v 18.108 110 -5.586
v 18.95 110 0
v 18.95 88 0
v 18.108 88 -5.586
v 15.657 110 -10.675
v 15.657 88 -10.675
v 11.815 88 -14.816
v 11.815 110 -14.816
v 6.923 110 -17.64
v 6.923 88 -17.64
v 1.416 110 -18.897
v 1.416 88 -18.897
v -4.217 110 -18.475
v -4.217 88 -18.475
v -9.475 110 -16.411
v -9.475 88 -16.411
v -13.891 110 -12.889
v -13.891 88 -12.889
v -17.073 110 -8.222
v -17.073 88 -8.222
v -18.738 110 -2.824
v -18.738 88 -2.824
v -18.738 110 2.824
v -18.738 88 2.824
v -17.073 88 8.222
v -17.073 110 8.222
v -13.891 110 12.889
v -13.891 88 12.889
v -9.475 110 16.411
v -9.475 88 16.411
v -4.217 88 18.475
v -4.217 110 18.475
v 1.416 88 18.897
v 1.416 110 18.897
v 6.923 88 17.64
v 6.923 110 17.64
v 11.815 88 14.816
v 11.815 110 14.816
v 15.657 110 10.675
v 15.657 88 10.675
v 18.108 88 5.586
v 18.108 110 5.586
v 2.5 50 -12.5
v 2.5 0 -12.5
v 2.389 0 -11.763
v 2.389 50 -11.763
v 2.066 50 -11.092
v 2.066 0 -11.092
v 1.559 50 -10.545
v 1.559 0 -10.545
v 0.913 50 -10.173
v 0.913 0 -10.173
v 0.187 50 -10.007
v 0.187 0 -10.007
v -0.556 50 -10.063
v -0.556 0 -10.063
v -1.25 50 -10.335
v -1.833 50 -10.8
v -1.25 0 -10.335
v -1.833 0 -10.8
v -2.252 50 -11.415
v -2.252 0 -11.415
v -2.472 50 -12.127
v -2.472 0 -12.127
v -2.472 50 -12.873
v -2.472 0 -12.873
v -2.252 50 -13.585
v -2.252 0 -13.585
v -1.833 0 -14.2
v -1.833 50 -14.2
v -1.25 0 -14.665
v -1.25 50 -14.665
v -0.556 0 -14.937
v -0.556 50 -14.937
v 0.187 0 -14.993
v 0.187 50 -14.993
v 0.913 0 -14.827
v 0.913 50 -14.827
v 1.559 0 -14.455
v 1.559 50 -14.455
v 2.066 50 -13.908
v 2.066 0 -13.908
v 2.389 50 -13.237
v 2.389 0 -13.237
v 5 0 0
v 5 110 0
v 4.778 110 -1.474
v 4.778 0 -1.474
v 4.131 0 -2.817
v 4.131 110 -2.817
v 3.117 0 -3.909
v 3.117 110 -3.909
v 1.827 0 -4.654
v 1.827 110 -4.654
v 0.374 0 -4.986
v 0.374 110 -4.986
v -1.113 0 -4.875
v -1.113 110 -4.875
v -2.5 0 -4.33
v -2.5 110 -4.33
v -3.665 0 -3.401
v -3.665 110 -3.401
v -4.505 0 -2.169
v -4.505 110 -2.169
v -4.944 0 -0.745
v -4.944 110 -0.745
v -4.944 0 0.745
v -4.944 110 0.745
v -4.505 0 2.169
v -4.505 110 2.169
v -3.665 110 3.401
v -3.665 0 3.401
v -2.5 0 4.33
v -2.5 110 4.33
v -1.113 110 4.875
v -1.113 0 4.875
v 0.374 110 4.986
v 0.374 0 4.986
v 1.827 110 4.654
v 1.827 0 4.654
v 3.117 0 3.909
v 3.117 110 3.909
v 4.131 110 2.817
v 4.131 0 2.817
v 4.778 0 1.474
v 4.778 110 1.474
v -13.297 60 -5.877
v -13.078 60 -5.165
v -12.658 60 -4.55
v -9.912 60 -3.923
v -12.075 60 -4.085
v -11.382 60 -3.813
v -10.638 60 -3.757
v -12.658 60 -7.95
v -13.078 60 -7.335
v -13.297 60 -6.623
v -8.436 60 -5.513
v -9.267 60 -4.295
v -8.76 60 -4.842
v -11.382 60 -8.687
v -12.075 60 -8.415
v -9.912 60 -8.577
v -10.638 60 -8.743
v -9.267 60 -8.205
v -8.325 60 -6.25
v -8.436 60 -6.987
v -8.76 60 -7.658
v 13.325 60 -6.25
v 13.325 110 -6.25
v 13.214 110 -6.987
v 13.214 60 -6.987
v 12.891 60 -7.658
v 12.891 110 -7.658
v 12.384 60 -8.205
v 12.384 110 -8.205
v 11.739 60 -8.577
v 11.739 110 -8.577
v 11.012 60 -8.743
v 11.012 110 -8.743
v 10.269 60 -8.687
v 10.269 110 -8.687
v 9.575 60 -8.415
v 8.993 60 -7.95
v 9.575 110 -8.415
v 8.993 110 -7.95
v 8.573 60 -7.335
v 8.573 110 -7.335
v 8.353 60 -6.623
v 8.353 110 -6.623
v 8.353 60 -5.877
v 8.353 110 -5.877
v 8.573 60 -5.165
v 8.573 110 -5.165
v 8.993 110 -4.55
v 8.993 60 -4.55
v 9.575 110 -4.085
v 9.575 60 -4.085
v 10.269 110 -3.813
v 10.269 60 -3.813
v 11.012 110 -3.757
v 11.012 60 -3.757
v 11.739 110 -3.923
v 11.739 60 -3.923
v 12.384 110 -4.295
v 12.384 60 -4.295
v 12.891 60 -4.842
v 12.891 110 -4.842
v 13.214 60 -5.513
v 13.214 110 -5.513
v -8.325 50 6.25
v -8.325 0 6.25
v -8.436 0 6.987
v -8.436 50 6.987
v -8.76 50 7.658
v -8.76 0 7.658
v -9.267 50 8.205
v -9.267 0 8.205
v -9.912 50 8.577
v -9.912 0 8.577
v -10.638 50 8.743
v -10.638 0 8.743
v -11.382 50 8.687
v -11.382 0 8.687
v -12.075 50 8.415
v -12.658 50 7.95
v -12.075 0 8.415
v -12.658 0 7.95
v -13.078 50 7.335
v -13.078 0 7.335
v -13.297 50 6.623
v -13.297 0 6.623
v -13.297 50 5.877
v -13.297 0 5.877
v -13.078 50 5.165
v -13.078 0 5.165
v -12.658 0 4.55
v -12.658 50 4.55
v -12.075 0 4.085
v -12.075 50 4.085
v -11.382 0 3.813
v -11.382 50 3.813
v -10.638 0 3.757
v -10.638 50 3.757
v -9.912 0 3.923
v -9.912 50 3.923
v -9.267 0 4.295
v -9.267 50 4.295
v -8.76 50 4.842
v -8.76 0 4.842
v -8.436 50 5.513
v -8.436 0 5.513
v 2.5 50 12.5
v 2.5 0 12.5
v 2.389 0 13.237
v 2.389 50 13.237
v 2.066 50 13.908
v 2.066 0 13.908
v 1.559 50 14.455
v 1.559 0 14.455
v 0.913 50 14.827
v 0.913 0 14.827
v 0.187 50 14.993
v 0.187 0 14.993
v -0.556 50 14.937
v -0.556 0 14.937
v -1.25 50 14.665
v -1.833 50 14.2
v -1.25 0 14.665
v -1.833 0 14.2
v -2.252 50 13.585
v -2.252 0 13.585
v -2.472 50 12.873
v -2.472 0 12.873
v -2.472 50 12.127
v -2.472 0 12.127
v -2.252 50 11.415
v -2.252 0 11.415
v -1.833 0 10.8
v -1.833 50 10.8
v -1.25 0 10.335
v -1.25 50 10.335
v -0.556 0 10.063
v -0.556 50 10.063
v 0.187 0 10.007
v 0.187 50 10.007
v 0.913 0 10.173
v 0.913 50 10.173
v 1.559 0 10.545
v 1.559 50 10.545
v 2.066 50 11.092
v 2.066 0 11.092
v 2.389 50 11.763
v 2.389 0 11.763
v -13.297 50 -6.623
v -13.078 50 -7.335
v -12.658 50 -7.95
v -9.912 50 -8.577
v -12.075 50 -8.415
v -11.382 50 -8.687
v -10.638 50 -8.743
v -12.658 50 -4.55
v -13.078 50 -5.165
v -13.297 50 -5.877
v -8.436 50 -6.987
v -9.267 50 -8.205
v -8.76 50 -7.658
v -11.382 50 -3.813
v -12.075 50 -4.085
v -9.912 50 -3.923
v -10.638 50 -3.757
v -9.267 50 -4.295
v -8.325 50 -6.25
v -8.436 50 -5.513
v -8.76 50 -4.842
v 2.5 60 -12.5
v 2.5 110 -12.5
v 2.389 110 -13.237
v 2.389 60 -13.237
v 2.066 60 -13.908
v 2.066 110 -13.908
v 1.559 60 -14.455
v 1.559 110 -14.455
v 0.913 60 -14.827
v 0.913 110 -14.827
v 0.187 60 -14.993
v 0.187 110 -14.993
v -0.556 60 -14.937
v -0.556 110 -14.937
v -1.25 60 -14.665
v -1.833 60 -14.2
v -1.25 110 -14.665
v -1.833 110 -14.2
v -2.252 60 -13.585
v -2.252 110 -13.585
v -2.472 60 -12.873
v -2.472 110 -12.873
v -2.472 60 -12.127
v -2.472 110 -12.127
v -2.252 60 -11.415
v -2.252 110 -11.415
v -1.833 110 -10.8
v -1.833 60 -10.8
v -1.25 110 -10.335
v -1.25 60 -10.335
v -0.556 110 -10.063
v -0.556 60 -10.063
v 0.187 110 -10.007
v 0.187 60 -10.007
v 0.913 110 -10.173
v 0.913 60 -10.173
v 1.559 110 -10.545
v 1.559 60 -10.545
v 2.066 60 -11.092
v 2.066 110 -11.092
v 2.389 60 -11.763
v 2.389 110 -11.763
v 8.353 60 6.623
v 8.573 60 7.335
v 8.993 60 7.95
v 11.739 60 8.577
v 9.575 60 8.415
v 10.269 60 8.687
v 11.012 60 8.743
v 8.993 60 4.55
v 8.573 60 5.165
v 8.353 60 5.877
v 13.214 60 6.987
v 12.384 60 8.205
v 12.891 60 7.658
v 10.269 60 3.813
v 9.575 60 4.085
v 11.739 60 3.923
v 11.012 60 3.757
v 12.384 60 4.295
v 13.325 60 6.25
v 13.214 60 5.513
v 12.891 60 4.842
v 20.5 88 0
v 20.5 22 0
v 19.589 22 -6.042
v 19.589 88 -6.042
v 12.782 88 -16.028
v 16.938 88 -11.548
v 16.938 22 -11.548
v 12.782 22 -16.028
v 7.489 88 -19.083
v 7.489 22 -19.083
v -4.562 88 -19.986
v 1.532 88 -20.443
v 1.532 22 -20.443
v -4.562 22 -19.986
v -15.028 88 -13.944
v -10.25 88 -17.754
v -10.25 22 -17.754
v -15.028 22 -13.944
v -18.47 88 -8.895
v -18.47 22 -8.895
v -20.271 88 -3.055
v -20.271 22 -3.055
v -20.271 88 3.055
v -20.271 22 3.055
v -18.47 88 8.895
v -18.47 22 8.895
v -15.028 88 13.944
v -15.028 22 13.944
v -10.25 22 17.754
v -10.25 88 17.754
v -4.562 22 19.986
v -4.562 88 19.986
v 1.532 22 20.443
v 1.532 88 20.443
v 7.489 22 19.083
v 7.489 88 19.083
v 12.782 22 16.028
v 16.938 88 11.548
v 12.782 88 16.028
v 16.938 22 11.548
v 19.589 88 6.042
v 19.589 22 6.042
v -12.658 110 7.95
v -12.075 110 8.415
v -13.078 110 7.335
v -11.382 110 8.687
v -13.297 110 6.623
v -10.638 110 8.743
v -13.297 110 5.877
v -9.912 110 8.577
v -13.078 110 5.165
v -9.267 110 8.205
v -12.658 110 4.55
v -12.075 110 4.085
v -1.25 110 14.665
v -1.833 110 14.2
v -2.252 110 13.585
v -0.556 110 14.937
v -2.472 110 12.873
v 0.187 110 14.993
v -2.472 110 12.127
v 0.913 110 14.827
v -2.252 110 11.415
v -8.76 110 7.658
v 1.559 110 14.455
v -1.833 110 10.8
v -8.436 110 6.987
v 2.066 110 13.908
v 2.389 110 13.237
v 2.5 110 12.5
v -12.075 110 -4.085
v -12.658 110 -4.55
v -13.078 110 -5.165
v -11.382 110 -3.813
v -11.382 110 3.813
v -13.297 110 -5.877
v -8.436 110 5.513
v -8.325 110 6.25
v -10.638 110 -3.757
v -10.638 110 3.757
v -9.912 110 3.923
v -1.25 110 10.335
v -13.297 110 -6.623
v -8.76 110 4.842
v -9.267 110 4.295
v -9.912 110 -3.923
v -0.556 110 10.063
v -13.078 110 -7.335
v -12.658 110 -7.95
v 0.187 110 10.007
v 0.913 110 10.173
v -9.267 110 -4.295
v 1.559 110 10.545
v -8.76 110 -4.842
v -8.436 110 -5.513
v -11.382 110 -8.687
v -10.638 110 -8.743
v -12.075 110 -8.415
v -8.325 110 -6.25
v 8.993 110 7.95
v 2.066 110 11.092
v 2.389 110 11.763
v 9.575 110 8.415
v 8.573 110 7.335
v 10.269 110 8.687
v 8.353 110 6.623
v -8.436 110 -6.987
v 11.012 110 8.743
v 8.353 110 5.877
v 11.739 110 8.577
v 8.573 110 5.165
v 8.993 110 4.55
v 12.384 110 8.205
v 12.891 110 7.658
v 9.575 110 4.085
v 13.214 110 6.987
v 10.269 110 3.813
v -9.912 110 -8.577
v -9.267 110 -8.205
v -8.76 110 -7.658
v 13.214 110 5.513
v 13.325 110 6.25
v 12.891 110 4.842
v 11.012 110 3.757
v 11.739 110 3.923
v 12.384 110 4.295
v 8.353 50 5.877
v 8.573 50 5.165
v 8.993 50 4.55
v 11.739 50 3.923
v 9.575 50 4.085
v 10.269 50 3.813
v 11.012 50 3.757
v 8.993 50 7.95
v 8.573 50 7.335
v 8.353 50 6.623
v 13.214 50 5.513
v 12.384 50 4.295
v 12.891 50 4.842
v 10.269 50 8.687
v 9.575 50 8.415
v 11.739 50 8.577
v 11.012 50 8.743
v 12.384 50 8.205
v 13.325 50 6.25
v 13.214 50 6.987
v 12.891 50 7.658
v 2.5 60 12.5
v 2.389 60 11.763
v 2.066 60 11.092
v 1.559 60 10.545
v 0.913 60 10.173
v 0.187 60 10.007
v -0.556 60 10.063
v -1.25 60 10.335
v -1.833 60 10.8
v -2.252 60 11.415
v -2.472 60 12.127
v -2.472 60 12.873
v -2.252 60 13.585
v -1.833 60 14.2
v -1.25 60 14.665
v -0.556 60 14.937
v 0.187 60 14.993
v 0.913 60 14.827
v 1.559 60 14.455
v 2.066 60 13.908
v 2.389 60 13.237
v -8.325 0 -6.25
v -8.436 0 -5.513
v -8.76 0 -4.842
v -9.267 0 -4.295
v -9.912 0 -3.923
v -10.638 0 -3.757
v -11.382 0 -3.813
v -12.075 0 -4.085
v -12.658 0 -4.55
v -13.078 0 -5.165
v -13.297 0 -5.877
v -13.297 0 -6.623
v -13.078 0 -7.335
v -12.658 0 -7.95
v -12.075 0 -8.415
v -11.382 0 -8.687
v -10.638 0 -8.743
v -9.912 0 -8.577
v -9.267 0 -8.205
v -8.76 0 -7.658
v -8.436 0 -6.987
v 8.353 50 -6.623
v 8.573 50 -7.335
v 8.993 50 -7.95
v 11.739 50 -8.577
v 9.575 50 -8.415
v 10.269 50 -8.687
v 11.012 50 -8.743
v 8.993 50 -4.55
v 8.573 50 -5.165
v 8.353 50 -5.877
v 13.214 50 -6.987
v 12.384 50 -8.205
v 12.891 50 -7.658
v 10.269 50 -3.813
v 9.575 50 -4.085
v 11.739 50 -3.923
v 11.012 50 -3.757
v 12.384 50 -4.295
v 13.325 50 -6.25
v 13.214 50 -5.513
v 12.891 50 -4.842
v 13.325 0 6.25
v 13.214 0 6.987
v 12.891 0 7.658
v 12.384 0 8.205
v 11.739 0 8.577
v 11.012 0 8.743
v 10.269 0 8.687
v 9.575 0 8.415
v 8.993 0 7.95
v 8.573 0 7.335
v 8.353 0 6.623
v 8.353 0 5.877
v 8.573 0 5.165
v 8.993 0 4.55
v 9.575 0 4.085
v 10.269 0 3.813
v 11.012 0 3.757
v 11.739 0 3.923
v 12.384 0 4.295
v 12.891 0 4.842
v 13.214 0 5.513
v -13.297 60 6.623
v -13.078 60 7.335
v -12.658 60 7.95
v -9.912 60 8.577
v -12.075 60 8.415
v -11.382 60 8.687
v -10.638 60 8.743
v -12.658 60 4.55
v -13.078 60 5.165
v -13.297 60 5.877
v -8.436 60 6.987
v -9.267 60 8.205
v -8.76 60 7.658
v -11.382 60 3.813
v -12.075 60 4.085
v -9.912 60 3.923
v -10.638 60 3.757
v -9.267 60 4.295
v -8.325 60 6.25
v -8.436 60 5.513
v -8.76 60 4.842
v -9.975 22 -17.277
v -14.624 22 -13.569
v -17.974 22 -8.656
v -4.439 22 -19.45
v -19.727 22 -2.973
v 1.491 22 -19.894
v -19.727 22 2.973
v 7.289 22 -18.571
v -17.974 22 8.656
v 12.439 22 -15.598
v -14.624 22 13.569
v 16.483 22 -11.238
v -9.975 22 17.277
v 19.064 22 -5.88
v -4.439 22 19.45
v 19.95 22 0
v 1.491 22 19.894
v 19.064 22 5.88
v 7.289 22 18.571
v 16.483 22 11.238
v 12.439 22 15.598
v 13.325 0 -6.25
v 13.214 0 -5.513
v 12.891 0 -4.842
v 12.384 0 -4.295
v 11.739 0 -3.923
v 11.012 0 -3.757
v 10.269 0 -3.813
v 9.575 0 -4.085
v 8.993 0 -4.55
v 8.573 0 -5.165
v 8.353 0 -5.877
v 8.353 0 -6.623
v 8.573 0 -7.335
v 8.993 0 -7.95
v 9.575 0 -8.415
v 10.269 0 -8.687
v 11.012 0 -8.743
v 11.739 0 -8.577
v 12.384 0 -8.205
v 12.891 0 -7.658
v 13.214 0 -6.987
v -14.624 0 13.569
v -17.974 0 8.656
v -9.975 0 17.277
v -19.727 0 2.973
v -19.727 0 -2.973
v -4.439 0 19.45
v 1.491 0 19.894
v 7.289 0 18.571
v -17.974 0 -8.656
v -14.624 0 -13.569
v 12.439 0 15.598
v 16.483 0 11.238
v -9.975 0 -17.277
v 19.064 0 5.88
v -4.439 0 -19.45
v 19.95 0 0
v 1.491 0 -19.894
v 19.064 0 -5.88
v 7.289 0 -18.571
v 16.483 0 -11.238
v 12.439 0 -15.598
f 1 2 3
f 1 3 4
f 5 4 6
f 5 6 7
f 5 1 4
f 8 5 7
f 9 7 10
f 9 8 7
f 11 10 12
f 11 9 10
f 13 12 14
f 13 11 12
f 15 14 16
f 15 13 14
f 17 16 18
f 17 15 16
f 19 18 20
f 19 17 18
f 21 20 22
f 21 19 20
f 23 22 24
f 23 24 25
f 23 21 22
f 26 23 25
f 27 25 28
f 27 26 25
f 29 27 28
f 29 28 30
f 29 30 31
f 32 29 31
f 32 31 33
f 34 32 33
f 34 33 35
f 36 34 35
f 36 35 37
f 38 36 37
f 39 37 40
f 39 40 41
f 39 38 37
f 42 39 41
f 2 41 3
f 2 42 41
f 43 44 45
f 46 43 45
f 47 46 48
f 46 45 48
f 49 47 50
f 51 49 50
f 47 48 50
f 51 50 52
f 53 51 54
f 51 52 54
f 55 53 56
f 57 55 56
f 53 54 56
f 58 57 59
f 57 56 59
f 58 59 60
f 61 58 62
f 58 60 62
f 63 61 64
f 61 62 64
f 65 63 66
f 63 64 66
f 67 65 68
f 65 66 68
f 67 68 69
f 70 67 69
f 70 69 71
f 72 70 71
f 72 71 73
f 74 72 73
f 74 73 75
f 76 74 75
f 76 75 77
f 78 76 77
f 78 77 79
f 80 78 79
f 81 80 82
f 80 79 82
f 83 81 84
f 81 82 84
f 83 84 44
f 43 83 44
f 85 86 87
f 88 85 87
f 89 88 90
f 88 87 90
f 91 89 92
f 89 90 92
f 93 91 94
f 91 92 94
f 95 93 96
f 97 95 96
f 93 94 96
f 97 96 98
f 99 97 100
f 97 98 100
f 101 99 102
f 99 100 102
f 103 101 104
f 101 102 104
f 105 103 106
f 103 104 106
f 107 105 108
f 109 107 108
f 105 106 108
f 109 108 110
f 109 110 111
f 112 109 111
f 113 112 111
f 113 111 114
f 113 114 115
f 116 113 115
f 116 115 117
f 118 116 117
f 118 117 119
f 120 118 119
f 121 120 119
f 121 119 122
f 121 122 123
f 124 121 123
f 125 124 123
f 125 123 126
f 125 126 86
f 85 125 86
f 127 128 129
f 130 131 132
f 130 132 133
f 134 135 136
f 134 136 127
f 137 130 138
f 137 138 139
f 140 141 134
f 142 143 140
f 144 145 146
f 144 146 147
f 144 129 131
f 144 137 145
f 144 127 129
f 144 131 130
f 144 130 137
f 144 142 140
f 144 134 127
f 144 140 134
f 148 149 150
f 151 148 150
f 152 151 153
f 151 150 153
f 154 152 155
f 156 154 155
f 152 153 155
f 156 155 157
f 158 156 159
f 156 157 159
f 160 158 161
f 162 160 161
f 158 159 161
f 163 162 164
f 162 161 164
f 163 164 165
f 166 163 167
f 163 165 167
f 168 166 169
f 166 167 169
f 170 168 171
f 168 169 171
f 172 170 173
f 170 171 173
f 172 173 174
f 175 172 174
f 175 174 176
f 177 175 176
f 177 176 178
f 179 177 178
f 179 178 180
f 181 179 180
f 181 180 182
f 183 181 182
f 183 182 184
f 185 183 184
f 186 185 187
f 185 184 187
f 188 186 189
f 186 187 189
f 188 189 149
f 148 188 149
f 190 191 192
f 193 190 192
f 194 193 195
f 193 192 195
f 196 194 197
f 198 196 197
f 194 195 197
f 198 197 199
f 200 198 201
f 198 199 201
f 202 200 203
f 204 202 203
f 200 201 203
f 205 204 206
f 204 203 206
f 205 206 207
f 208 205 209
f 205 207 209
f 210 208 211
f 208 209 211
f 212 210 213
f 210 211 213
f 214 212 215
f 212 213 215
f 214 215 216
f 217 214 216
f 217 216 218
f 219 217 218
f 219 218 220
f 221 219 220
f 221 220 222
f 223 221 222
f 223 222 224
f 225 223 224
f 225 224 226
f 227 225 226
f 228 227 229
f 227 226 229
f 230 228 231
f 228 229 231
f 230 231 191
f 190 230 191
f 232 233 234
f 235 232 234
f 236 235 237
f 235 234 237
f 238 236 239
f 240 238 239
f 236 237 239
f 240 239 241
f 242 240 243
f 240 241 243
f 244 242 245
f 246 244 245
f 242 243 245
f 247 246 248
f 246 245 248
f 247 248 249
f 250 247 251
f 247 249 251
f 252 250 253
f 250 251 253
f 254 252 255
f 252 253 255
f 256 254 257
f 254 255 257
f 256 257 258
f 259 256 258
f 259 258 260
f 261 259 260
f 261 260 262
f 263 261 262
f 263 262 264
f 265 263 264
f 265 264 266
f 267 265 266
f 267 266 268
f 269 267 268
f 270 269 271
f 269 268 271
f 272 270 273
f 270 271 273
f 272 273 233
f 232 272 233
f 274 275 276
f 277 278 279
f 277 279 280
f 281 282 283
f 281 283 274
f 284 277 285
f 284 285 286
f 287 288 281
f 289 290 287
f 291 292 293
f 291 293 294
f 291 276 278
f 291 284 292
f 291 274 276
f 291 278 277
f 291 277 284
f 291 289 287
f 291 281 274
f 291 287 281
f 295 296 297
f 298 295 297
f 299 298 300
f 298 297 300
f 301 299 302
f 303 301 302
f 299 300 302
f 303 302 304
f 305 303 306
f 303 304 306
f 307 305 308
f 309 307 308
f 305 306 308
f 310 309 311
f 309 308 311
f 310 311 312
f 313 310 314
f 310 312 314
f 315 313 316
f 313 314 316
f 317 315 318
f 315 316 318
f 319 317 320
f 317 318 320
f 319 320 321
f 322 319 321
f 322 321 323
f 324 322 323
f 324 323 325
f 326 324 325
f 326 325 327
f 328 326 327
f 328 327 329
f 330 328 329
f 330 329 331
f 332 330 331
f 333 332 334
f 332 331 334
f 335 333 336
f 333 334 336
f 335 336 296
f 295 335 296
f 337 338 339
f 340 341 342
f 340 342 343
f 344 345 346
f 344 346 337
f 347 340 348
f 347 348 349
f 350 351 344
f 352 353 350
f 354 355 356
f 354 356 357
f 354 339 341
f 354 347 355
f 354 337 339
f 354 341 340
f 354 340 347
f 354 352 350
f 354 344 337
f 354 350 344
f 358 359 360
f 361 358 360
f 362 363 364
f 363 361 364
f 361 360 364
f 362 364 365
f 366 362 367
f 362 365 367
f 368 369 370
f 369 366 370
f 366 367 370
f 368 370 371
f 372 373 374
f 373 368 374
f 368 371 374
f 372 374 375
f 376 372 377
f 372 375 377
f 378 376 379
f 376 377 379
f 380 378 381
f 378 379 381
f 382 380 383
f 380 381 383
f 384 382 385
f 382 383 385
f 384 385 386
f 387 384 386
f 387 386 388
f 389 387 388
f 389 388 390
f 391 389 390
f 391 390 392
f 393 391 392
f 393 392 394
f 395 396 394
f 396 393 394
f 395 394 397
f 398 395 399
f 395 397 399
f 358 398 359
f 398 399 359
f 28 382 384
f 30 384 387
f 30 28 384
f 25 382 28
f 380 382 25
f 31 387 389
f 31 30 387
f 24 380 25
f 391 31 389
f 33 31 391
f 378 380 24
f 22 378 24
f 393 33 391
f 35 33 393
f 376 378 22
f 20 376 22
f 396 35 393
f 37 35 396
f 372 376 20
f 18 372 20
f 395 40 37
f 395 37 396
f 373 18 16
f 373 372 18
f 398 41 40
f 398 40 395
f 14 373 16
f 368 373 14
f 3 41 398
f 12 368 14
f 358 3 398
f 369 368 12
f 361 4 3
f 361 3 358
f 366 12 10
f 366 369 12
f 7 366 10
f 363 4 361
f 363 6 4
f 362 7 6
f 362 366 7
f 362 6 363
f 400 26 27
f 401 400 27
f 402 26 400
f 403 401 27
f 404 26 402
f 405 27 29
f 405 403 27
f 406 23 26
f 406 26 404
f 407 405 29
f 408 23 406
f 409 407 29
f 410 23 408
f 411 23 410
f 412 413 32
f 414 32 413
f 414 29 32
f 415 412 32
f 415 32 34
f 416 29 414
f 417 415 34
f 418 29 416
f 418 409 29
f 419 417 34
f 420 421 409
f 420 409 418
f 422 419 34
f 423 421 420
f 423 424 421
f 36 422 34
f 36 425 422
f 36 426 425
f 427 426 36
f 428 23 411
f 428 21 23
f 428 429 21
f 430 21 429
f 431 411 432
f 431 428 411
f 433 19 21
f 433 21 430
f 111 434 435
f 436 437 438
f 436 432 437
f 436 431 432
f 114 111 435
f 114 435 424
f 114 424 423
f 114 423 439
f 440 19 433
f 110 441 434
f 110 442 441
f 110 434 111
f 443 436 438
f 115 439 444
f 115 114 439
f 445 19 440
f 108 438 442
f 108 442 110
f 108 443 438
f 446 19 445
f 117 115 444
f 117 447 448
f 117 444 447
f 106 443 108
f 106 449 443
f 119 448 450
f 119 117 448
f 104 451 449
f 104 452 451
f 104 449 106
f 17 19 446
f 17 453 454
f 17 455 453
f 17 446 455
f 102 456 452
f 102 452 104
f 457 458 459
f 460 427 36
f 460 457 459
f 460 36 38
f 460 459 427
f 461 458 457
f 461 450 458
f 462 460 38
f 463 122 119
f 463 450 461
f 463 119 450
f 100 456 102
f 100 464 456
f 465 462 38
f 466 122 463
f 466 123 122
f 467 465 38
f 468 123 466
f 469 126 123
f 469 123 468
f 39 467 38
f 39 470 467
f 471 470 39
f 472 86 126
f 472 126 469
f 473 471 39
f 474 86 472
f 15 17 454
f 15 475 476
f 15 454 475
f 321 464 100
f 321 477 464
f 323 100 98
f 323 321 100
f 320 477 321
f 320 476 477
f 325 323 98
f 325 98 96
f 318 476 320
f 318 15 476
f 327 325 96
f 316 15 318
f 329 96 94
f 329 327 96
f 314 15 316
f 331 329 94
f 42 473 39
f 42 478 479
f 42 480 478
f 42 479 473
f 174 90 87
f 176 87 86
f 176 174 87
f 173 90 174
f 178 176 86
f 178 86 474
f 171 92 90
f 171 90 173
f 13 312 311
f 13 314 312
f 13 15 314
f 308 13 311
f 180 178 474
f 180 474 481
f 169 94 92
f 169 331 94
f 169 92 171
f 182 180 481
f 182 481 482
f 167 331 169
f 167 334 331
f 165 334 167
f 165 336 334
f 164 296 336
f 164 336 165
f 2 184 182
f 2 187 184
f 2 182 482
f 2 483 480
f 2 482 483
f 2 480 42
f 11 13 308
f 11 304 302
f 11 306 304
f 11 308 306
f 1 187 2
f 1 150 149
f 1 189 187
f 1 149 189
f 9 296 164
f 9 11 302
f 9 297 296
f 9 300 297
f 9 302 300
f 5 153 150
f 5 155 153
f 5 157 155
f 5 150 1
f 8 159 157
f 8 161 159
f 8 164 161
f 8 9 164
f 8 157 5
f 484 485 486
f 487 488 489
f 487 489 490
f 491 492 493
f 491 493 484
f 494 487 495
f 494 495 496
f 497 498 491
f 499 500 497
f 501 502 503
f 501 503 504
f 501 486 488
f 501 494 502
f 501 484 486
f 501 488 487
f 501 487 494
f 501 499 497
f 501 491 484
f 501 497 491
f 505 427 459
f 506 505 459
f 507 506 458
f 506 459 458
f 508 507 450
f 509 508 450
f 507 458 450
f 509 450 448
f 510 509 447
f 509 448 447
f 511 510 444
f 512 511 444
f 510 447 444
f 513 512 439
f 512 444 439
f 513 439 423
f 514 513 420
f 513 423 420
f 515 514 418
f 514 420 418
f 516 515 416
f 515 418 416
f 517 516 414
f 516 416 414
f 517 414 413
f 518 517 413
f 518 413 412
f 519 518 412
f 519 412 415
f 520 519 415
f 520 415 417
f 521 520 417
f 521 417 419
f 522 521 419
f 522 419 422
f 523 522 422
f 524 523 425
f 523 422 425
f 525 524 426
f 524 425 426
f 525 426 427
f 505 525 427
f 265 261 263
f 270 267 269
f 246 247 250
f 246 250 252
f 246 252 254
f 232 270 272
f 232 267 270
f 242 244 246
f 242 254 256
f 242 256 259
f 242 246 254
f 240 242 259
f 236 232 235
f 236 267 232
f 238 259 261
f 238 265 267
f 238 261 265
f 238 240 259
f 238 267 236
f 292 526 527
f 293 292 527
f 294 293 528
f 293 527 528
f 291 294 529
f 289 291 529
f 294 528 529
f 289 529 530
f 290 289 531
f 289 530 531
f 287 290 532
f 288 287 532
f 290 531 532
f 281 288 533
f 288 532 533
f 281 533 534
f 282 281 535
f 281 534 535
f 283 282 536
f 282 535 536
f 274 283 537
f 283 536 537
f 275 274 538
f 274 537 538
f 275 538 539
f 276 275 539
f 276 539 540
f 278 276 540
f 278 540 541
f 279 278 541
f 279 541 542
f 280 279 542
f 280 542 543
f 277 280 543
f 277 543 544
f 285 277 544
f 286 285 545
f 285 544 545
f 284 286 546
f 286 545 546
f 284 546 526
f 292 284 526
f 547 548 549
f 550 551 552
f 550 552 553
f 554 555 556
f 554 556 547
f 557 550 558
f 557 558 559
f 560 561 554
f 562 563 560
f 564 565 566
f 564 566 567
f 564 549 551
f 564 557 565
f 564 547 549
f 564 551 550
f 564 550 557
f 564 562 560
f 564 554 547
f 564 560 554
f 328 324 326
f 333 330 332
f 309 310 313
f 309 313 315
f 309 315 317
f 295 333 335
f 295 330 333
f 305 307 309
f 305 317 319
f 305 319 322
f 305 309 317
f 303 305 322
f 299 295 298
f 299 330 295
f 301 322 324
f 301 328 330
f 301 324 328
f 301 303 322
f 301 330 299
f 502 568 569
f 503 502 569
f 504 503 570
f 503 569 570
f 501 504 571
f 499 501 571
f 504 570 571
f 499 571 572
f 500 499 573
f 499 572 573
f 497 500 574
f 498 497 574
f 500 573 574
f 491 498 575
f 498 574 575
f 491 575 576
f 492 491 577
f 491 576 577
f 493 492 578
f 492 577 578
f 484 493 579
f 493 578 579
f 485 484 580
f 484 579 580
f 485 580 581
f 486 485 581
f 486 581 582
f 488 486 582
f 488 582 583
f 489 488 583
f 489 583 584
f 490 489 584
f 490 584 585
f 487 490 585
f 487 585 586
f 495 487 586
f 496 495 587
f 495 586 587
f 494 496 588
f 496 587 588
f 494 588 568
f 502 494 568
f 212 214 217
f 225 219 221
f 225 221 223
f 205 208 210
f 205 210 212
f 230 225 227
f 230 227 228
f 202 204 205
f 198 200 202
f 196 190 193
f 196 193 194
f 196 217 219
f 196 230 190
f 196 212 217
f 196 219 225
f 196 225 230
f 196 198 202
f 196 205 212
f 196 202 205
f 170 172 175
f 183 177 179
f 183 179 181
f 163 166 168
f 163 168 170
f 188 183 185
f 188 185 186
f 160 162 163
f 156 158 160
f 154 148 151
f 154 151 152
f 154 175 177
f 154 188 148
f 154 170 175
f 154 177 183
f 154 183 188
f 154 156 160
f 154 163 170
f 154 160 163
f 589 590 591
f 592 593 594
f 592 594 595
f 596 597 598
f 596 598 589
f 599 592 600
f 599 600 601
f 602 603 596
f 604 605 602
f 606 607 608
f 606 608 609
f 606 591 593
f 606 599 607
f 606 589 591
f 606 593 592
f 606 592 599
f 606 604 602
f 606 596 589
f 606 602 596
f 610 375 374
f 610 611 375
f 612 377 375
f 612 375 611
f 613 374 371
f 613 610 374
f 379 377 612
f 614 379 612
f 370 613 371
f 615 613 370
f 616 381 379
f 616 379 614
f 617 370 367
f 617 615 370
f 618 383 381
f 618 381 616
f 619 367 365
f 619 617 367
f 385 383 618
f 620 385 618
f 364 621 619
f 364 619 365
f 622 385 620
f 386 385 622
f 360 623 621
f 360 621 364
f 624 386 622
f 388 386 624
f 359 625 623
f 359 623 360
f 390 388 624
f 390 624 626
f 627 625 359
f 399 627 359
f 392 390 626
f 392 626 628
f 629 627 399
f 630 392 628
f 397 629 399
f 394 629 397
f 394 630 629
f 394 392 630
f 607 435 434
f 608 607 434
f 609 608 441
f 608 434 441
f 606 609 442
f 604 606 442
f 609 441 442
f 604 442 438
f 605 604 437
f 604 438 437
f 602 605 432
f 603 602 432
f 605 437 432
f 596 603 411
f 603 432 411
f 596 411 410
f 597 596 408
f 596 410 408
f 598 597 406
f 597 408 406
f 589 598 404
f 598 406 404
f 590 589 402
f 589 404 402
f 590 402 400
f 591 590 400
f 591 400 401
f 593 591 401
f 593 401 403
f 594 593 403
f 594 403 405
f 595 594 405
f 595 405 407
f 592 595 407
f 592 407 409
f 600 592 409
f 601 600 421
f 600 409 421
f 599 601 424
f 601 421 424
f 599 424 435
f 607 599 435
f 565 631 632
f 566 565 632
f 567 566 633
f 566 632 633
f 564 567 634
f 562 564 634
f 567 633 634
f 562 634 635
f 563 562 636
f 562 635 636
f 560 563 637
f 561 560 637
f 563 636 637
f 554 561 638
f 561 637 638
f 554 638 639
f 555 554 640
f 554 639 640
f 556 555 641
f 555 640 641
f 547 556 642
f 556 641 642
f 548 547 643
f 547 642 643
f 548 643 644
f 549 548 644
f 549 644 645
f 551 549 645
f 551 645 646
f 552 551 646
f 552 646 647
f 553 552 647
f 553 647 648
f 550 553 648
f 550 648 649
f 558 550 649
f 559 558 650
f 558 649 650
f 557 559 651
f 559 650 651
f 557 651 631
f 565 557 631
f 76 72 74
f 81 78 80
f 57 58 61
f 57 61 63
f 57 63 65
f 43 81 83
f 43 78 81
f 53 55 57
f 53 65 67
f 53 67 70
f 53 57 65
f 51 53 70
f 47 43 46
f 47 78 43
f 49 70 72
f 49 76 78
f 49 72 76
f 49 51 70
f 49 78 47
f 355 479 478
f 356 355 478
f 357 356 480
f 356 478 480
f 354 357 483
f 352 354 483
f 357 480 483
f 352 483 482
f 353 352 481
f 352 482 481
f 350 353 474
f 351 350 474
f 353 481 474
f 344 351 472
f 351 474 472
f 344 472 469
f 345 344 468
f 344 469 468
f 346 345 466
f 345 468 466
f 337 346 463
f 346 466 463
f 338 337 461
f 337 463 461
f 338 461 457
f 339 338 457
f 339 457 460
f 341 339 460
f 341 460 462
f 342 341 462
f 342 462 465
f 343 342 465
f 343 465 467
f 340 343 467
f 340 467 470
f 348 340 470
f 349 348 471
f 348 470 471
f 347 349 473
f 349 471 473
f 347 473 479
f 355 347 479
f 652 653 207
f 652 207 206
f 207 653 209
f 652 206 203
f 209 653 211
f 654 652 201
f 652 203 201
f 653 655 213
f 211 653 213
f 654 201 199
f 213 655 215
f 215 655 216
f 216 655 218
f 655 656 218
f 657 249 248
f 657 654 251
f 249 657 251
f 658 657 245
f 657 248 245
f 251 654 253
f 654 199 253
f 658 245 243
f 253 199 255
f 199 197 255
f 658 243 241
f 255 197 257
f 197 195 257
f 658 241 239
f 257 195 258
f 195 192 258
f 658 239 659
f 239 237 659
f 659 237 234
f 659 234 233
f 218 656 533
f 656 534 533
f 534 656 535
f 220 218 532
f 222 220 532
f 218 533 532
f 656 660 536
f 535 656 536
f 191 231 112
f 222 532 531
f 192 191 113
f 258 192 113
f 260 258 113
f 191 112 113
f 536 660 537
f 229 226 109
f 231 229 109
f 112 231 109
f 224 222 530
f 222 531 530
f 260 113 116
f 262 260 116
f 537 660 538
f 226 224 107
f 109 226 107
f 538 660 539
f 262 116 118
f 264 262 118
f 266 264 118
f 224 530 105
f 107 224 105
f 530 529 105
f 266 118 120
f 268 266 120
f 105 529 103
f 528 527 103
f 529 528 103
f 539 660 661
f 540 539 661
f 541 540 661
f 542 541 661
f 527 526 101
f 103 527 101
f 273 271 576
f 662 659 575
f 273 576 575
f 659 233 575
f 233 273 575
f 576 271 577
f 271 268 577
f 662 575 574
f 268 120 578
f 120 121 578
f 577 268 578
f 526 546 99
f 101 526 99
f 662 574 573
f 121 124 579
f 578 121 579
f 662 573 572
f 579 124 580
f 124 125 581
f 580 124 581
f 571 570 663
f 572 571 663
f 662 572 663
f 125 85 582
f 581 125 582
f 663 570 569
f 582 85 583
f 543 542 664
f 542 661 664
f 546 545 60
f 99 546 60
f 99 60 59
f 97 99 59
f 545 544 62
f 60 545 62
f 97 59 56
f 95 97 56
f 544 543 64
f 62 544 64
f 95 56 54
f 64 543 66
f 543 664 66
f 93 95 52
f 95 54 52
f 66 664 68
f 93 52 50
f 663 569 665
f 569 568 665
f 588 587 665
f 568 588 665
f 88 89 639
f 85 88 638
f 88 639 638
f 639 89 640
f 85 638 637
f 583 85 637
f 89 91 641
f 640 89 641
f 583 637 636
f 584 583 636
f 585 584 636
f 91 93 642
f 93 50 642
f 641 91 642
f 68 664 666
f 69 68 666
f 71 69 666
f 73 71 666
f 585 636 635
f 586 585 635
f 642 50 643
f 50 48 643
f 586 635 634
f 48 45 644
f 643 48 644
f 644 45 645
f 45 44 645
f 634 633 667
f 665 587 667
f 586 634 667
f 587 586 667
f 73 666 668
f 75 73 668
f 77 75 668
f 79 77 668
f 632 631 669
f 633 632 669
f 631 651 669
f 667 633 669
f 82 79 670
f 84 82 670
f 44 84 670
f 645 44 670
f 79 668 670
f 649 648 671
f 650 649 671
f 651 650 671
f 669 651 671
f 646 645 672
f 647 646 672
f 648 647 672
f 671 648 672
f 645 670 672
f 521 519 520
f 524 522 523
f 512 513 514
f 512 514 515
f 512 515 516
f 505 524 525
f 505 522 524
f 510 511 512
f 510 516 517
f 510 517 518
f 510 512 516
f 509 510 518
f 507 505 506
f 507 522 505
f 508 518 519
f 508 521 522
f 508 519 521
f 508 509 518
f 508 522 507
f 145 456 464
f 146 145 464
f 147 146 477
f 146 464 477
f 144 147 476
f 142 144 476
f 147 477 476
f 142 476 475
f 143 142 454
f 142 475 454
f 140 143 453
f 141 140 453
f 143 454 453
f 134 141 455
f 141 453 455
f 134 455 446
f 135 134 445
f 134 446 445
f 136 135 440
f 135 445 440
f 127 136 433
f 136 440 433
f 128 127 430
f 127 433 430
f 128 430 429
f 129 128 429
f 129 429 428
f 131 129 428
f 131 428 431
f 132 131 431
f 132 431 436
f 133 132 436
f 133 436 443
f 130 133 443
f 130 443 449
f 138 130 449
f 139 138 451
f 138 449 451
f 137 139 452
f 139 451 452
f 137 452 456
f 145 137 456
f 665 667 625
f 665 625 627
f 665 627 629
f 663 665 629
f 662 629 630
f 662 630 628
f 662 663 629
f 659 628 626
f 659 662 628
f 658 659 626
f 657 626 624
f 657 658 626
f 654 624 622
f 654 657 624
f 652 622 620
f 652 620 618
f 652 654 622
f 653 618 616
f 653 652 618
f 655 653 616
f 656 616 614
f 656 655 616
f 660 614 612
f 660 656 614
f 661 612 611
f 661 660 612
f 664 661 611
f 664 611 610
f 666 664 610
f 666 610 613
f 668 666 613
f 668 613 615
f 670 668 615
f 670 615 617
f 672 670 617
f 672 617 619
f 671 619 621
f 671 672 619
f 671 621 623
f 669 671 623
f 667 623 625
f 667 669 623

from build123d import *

# Parameters (mm, degrees)
ESQUISSE1_R             = 20.5
BOSS_EXTRU_1_DEPTH      = 110
ESQUISSE2_OUTSIDE_W     = 67.87
ESQUISSE2_OUTSIDE_H     = 67.87
ESQUISSE2_OUTSIDE_R     = 18.95
ENL_V_MAT_EXTRU_1_DEPTH = 22
ESQUISSE3_OUTSIDE_W     = 67.87
ESQUISSE3_OUTSIDE_H     = 67.87
ESQUISSE3_OUTSIDE_R     = 19.95
ENL_V_MAT_EXTRU_2_DEPTH = 22
ESQUISSE5_R             = 5
ENL_V_MAT_EXTRU_3_DEPTH = 111
ESQUISSE6_R             = 2.5
ENL_V_MAT_EXTRU_4_DEPTH = 50
ESQUISSE7_R             = 2.5
ENL_V_MAT_EXTRU_5_DEPTH = 50


with BuildPart() as part:
    # Esquisse1 → Boss.-Extru.1 (new body)
    with BuildSketch(Plane(origin=(0, 0, 0), x_dir=(1, 0, 0), z_dir=(0, 1, 0))):
        Circle(ESQUISSE1_R)
    extrude(amount=BOSS_EXTRU_1_DEPTH)

    # Esquisse2 outside → Enlèv. mat.-Extru.1 (cut)
    with BuildSketch(Plane(origin=(0, 110, 0), x_dir=(1, 0, 0), z_dir=(0, 1, 0))):
        Rectangle(ESQUISSE2_OUTSIDE_W, ESQUISSE2_OUTSIDE_H)
        Circle(ESQUISSE2_OUTSIDE_R, mode=Mode.SUBTRACT)
    extrude(amount=-ENL_V_MAT_EXTRU_1_DEPTH, mode=Mode.SUBTRACT)

    # Esquisse3 outside → Enlèv. mat.-Extru.2 (cut)
    with BuildSketch(Plane.XZ):
        Rectangle(ESQUISSE3_OUTSIDE_W, ESQUISSE3_OUTSIDE_H)
        Circle(ESQUISSE3_OUTSIDE_R, mode=Mode.SUBTRACT)
    extrude(amount=-ENL_V_MAT_EXTRU_2_DEPTH, mode=Mode.SUBTRACT)

    # Esquisse5 → Enlèv. mat.-Extru.3 (cut, through all)
    with BuildSketch(Plane(origin=(0, 110, 0), x_dir=(1, 0, 0), z_dir=(0, 1, 0))):
        Circle(ESQUISSE5_R)
    extrude(amount=-ENL_V_MAT_EXTRU_3_DEPTH, mode=Mode.SUBTRACT)

    # Esquisse6 → Enlèv. mat.-Extru.4 (cut)
    with BuildSketch(Plane(origin=(0, 110, 0), x_dir=(1, 0, 0), z_dir=(0, 1, 0))):
        with Locations((0, -12.5)):
            Circle(ESQUISSE6_R)
        with Locations((-10.825317547, -6.25)):
            Circle(ESQUISSE6_R)
        with Locations((-10.825317547, 6.25)):
            Circle(ESQUISSE6_R)
        with Locations((0, 12.5)):
            Circle(ESQUISSE6_R)
        with Locations((10.825317547, 6.25)):
            Circle(ESQUISSE6_R)
        with Locations((10.825317547, -6.25)):
            Circle(ESQUISSE6_R)
    extrude(amount=-ENL_V_MAT_EXTRU_4_DEPTH, mode=Mode.SUBTRACT)

    # Esquisse7 → Enlèv. mat.-Extru.5 (cut)
    with BuildSketch(Plane.XZ):
        with Locations((10.825317547, -6.25)):
            Circle(ESQUISSE7_R)
        with Locations((0, -12.5)):
            Circle(ESQUISSE7_R)
        with Locations((-10.825317547, -6.25)):
            Circle(ESQUISSE7_R)
        with Locations((-10.825317547, 6.25)):
            Circle(ESQUISSE7_R)
        with Locations((0, 12.5)):
            Circle(ESQUISSE7_R)
        with Locations((10.825317547, 6.25)):
            Circle(ESQUISSE7_R)
    extrude(amount=-ENL_V_MAT_EXTRU_5_DEPTH, mode=Mode.SUBTRACT)


solid = part.part
